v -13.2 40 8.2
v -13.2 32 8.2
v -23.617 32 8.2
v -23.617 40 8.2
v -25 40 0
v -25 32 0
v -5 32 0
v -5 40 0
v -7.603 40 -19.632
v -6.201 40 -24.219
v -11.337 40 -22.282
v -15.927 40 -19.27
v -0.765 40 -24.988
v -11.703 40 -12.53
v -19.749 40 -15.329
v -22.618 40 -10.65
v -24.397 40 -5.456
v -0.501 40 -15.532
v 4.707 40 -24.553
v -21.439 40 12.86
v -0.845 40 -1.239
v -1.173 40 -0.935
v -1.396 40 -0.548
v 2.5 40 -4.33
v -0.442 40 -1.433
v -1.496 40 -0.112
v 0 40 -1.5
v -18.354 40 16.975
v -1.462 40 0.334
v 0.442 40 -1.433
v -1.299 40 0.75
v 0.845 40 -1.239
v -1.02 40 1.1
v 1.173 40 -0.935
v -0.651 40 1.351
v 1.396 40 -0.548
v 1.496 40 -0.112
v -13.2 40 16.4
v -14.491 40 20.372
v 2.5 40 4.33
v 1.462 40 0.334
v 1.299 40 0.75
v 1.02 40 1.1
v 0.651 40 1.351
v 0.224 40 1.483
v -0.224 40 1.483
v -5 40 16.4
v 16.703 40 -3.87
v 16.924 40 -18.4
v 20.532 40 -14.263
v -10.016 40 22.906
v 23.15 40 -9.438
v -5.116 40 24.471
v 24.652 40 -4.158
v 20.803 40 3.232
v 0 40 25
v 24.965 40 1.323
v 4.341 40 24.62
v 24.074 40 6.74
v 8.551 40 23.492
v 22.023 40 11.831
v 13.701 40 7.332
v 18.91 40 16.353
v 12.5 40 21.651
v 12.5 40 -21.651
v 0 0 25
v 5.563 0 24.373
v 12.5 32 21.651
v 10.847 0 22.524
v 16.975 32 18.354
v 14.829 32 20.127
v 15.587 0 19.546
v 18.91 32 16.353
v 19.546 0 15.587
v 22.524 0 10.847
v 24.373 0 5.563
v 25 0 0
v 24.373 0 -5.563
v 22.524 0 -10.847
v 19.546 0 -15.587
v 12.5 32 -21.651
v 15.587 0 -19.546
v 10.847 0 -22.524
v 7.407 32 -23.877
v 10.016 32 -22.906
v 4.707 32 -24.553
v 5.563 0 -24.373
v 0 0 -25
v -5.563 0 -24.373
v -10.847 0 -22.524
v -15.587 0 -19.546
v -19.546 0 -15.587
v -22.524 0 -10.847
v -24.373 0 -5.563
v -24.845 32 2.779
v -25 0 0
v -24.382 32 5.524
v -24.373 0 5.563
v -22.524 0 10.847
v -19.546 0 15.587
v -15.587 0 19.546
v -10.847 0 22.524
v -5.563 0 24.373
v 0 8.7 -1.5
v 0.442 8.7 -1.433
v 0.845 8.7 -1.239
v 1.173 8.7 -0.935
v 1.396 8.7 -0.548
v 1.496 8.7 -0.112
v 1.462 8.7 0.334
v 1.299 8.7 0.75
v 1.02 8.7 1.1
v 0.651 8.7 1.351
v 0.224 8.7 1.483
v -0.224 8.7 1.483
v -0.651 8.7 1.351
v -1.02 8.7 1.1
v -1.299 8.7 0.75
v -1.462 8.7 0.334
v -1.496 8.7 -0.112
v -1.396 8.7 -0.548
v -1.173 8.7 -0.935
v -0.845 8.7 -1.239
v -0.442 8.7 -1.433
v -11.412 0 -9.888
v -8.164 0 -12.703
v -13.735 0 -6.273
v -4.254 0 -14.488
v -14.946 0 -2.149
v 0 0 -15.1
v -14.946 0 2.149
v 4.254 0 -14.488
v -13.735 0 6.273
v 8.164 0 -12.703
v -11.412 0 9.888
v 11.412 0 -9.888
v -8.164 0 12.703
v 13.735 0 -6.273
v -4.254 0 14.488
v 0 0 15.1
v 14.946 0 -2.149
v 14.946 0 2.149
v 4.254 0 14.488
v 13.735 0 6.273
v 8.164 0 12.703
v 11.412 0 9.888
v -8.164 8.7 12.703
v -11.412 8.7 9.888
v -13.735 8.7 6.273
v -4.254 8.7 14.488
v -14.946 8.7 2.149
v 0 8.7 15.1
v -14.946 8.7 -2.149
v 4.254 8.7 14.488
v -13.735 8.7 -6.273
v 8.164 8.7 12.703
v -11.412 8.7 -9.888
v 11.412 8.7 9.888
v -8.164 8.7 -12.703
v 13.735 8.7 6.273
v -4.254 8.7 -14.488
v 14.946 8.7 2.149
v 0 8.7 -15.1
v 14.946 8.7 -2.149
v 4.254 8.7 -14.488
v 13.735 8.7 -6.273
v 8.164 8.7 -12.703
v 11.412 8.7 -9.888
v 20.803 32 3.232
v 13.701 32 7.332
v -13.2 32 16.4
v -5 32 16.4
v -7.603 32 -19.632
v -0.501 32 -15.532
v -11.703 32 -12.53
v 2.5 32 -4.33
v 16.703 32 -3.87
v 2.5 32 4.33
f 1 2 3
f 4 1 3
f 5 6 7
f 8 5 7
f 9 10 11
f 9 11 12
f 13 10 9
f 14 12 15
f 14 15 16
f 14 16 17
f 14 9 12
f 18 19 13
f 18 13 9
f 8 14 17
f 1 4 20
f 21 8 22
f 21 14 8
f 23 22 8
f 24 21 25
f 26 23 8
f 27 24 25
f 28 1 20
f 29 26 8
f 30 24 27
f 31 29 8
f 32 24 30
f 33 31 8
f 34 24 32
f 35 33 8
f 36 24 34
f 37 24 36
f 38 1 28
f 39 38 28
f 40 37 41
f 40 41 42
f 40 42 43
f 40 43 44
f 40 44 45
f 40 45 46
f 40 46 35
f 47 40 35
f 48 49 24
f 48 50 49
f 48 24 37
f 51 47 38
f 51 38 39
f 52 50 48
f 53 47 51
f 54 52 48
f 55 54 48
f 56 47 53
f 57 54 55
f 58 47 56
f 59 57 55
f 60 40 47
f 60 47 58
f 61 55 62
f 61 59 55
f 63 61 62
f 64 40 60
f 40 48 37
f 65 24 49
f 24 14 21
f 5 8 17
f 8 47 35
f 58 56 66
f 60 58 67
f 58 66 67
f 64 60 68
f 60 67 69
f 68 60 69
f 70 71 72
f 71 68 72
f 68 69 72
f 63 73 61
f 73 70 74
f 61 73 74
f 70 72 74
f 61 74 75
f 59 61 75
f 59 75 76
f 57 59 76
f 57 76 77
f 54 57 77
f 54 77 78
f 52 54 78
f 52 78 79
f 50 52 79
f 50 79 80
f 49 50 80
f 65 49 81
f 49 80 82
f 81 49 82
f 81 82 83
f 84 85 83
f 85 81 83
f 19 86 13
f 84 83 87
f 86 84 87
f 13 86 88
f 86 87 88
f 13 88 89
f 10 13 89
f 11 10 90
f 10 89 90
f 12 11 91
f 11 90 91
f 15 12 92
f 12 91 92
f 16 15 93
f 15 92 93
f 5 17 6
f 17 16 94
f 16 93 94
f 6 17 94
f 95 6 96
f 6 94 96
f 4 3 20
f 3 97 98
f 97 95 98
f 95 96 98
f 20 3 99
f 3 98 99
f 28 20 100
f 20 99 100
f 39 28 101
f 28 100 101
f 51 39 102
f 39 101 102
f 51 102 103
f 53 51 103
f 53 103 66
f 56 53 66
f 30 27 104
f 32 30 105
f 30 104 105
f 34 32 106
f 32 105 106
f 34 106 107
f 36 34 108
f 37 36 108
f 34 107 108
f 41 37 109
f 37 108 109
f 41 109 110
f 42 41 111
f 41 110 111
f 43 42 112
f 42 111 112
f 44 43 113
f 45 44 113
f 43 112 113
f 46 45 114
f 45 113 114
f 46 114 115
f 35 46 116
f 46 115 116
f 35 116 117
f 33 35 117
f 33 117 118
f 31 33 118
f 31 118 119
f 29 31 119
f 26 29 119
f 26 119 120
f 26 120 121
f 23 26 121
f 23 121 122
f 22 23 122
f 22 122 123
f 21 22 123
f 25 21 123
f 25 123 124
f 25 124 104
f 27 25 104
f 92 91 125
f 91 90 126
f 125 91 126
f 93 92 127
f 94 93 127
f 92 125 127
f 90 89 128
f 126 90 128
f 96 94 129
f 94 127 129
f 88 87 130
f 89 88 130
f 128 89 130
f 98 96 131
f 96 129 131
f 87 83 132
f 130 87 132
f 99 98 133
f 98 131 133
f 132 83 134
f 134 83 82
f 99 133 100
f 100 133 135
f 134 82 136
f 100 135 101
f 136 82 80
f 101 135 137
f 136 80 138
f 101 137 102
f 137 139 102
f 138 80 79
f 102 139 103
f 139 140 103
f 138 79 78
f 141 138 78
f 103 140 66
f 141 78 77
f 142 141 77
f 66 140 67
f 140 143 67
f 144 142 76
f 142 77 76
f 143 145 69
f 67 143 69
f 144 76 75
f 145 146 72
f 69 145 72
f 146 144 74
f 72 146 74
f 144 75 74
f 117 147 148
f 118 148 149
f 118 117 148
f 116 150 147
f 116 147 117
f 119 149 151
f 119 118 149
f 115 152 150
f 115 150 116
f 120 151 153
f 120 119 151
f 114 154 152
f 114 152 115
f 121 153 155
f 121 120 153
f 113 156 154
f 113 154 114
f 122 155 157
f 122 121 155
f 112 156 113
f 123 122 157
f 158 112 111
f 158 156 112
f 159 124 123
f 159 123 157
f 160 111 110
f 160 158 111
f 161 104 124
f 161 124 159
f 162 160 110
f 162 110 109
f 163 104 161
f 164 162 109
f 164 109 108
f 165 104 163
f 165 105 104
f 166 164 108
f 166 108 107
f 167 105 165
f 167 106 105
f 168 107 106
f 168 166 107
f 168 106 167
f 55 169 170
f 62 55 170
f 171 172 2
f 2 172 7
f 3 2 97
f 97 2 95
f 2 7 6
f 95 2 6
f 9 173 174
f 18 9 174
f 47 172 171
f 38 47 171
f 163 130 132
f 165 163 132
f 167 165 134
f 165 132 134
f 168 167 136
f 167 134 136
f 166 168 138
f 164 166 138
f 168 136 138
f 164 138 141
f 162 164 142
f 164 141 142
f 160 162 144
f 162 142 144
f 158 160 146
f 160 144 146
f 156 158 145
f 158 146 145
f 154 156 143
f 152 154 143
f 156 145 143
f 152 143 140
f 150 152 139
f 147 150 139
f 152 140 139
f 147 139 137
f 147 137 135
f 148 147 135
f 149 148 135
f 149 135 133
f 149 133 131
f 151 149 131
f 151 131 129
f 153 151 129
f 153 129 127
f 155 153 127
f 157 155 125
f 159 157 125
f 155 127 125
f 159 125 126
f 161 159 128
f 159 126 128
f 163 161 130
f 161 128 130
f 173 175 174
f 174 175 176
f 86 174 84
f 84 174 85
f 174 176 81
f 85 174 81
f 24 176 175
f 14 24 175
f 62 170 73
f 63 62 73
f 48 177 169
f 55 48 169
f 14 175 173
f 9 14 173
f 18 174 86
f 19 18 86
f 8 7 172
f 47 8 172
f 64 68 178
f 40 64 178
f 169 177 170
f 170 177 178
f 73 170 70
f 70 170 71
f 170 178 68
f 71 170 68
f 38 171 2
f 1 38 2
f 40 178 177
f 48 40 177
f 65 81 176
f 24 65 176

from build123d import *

# Parameters (mm, degrees)
SKETCH1_R           = 25
BOSS_EXTRUDE1_DEPTH = 40
CUT_EXTRUDE1_START  = -8
CUT_EXTRUDE1_DEPTH  = 8
CIRPATTERN1_COUNT   = 3
SKETCH7_R           = 15.1
CUT_EXTRUDE3_DEPTH  = 8.7
SKETCH8_R           = 1.5
CUT_EXTRUDE4_DEPTH  = 48.219593391


with BuildPart() as part:
    # Sketch1 → Boss-Extrude1 (new body)
    with BuildSketch(Plane(origin=(0, 0, 0), x_dir=(1, 0, 0), z_dir=(0, 1, 0))):
        with Locations(Location((0, 0, 0), (0, 0, 270))):
            Circle(SKETCH1_R)
    extrude(amount=BOSS_EXTRUDE1_DEPTH)

    # Sketch2 → Cut-Extrude1 (cut)
    with BuildSketch(Plane(origin=(0, 40, 0), x_dir=(1, 0, 0), z_dir=(0, 1, 0)).offset(CUT_EXTRUDE1_START)):
        with BuildLine():
            Line((-25, 0), (-5, 0))
            Line((-5, 0), (-5, -16.4))
            Line((-5, -16.4), (-13.2, -16.4))
            Line((-13.2, -16.4), (-13.2, -8.2))
            Line((-13.2, -8.2), (-23.616943071, -8.2))
            ThreePointArc((-23.616943071, -8.2), (-24.651811057, -4.157909525), (-25, 0))
        make_face()
    cut_extrude1 = extrude(amount=CUT_EXTRUDE1_DEPTH, mode=Mode.SUBTRACT)

    # CirPattern1: Cut-Extrude1 ×3 about axis
    cirpattern1_axis = Axis((0, 0, 0), (0, 1, 0))
    for i in range(1, CIRPATTERN1_COUNT):
        add(cut_extrude1.rotate(cirpattern1_axis, i * 360 / CIRPATTERN1_COUNT), mode=Mode.SUBTRACT)

    # Sketch7 → Cut-Extrude3 (cut)
    with BuildSketch(Plane.XZ):
        with Locations(Location((0, 0, 0), (0, 0, 270))):
            Circle(SKETCH7_R)
    extrude(amount=-CUT_EXTRUDE3_DEPTH, mode=Mode.SUBTRACT)

    # Sketch8 → Cut-Extrude4 (cut, through all)
    with BuildSketch(Plane.XZ.offset(-8.7)):
        with Locations(Location((0, 0, 0), (0, 0, 270))):
            Circle(SKETCH8_R)
    extrude(amount=-CUT_EXTRUDE4_DEPTH, mode=Mode.SUBTRACT)


solid = part.part
